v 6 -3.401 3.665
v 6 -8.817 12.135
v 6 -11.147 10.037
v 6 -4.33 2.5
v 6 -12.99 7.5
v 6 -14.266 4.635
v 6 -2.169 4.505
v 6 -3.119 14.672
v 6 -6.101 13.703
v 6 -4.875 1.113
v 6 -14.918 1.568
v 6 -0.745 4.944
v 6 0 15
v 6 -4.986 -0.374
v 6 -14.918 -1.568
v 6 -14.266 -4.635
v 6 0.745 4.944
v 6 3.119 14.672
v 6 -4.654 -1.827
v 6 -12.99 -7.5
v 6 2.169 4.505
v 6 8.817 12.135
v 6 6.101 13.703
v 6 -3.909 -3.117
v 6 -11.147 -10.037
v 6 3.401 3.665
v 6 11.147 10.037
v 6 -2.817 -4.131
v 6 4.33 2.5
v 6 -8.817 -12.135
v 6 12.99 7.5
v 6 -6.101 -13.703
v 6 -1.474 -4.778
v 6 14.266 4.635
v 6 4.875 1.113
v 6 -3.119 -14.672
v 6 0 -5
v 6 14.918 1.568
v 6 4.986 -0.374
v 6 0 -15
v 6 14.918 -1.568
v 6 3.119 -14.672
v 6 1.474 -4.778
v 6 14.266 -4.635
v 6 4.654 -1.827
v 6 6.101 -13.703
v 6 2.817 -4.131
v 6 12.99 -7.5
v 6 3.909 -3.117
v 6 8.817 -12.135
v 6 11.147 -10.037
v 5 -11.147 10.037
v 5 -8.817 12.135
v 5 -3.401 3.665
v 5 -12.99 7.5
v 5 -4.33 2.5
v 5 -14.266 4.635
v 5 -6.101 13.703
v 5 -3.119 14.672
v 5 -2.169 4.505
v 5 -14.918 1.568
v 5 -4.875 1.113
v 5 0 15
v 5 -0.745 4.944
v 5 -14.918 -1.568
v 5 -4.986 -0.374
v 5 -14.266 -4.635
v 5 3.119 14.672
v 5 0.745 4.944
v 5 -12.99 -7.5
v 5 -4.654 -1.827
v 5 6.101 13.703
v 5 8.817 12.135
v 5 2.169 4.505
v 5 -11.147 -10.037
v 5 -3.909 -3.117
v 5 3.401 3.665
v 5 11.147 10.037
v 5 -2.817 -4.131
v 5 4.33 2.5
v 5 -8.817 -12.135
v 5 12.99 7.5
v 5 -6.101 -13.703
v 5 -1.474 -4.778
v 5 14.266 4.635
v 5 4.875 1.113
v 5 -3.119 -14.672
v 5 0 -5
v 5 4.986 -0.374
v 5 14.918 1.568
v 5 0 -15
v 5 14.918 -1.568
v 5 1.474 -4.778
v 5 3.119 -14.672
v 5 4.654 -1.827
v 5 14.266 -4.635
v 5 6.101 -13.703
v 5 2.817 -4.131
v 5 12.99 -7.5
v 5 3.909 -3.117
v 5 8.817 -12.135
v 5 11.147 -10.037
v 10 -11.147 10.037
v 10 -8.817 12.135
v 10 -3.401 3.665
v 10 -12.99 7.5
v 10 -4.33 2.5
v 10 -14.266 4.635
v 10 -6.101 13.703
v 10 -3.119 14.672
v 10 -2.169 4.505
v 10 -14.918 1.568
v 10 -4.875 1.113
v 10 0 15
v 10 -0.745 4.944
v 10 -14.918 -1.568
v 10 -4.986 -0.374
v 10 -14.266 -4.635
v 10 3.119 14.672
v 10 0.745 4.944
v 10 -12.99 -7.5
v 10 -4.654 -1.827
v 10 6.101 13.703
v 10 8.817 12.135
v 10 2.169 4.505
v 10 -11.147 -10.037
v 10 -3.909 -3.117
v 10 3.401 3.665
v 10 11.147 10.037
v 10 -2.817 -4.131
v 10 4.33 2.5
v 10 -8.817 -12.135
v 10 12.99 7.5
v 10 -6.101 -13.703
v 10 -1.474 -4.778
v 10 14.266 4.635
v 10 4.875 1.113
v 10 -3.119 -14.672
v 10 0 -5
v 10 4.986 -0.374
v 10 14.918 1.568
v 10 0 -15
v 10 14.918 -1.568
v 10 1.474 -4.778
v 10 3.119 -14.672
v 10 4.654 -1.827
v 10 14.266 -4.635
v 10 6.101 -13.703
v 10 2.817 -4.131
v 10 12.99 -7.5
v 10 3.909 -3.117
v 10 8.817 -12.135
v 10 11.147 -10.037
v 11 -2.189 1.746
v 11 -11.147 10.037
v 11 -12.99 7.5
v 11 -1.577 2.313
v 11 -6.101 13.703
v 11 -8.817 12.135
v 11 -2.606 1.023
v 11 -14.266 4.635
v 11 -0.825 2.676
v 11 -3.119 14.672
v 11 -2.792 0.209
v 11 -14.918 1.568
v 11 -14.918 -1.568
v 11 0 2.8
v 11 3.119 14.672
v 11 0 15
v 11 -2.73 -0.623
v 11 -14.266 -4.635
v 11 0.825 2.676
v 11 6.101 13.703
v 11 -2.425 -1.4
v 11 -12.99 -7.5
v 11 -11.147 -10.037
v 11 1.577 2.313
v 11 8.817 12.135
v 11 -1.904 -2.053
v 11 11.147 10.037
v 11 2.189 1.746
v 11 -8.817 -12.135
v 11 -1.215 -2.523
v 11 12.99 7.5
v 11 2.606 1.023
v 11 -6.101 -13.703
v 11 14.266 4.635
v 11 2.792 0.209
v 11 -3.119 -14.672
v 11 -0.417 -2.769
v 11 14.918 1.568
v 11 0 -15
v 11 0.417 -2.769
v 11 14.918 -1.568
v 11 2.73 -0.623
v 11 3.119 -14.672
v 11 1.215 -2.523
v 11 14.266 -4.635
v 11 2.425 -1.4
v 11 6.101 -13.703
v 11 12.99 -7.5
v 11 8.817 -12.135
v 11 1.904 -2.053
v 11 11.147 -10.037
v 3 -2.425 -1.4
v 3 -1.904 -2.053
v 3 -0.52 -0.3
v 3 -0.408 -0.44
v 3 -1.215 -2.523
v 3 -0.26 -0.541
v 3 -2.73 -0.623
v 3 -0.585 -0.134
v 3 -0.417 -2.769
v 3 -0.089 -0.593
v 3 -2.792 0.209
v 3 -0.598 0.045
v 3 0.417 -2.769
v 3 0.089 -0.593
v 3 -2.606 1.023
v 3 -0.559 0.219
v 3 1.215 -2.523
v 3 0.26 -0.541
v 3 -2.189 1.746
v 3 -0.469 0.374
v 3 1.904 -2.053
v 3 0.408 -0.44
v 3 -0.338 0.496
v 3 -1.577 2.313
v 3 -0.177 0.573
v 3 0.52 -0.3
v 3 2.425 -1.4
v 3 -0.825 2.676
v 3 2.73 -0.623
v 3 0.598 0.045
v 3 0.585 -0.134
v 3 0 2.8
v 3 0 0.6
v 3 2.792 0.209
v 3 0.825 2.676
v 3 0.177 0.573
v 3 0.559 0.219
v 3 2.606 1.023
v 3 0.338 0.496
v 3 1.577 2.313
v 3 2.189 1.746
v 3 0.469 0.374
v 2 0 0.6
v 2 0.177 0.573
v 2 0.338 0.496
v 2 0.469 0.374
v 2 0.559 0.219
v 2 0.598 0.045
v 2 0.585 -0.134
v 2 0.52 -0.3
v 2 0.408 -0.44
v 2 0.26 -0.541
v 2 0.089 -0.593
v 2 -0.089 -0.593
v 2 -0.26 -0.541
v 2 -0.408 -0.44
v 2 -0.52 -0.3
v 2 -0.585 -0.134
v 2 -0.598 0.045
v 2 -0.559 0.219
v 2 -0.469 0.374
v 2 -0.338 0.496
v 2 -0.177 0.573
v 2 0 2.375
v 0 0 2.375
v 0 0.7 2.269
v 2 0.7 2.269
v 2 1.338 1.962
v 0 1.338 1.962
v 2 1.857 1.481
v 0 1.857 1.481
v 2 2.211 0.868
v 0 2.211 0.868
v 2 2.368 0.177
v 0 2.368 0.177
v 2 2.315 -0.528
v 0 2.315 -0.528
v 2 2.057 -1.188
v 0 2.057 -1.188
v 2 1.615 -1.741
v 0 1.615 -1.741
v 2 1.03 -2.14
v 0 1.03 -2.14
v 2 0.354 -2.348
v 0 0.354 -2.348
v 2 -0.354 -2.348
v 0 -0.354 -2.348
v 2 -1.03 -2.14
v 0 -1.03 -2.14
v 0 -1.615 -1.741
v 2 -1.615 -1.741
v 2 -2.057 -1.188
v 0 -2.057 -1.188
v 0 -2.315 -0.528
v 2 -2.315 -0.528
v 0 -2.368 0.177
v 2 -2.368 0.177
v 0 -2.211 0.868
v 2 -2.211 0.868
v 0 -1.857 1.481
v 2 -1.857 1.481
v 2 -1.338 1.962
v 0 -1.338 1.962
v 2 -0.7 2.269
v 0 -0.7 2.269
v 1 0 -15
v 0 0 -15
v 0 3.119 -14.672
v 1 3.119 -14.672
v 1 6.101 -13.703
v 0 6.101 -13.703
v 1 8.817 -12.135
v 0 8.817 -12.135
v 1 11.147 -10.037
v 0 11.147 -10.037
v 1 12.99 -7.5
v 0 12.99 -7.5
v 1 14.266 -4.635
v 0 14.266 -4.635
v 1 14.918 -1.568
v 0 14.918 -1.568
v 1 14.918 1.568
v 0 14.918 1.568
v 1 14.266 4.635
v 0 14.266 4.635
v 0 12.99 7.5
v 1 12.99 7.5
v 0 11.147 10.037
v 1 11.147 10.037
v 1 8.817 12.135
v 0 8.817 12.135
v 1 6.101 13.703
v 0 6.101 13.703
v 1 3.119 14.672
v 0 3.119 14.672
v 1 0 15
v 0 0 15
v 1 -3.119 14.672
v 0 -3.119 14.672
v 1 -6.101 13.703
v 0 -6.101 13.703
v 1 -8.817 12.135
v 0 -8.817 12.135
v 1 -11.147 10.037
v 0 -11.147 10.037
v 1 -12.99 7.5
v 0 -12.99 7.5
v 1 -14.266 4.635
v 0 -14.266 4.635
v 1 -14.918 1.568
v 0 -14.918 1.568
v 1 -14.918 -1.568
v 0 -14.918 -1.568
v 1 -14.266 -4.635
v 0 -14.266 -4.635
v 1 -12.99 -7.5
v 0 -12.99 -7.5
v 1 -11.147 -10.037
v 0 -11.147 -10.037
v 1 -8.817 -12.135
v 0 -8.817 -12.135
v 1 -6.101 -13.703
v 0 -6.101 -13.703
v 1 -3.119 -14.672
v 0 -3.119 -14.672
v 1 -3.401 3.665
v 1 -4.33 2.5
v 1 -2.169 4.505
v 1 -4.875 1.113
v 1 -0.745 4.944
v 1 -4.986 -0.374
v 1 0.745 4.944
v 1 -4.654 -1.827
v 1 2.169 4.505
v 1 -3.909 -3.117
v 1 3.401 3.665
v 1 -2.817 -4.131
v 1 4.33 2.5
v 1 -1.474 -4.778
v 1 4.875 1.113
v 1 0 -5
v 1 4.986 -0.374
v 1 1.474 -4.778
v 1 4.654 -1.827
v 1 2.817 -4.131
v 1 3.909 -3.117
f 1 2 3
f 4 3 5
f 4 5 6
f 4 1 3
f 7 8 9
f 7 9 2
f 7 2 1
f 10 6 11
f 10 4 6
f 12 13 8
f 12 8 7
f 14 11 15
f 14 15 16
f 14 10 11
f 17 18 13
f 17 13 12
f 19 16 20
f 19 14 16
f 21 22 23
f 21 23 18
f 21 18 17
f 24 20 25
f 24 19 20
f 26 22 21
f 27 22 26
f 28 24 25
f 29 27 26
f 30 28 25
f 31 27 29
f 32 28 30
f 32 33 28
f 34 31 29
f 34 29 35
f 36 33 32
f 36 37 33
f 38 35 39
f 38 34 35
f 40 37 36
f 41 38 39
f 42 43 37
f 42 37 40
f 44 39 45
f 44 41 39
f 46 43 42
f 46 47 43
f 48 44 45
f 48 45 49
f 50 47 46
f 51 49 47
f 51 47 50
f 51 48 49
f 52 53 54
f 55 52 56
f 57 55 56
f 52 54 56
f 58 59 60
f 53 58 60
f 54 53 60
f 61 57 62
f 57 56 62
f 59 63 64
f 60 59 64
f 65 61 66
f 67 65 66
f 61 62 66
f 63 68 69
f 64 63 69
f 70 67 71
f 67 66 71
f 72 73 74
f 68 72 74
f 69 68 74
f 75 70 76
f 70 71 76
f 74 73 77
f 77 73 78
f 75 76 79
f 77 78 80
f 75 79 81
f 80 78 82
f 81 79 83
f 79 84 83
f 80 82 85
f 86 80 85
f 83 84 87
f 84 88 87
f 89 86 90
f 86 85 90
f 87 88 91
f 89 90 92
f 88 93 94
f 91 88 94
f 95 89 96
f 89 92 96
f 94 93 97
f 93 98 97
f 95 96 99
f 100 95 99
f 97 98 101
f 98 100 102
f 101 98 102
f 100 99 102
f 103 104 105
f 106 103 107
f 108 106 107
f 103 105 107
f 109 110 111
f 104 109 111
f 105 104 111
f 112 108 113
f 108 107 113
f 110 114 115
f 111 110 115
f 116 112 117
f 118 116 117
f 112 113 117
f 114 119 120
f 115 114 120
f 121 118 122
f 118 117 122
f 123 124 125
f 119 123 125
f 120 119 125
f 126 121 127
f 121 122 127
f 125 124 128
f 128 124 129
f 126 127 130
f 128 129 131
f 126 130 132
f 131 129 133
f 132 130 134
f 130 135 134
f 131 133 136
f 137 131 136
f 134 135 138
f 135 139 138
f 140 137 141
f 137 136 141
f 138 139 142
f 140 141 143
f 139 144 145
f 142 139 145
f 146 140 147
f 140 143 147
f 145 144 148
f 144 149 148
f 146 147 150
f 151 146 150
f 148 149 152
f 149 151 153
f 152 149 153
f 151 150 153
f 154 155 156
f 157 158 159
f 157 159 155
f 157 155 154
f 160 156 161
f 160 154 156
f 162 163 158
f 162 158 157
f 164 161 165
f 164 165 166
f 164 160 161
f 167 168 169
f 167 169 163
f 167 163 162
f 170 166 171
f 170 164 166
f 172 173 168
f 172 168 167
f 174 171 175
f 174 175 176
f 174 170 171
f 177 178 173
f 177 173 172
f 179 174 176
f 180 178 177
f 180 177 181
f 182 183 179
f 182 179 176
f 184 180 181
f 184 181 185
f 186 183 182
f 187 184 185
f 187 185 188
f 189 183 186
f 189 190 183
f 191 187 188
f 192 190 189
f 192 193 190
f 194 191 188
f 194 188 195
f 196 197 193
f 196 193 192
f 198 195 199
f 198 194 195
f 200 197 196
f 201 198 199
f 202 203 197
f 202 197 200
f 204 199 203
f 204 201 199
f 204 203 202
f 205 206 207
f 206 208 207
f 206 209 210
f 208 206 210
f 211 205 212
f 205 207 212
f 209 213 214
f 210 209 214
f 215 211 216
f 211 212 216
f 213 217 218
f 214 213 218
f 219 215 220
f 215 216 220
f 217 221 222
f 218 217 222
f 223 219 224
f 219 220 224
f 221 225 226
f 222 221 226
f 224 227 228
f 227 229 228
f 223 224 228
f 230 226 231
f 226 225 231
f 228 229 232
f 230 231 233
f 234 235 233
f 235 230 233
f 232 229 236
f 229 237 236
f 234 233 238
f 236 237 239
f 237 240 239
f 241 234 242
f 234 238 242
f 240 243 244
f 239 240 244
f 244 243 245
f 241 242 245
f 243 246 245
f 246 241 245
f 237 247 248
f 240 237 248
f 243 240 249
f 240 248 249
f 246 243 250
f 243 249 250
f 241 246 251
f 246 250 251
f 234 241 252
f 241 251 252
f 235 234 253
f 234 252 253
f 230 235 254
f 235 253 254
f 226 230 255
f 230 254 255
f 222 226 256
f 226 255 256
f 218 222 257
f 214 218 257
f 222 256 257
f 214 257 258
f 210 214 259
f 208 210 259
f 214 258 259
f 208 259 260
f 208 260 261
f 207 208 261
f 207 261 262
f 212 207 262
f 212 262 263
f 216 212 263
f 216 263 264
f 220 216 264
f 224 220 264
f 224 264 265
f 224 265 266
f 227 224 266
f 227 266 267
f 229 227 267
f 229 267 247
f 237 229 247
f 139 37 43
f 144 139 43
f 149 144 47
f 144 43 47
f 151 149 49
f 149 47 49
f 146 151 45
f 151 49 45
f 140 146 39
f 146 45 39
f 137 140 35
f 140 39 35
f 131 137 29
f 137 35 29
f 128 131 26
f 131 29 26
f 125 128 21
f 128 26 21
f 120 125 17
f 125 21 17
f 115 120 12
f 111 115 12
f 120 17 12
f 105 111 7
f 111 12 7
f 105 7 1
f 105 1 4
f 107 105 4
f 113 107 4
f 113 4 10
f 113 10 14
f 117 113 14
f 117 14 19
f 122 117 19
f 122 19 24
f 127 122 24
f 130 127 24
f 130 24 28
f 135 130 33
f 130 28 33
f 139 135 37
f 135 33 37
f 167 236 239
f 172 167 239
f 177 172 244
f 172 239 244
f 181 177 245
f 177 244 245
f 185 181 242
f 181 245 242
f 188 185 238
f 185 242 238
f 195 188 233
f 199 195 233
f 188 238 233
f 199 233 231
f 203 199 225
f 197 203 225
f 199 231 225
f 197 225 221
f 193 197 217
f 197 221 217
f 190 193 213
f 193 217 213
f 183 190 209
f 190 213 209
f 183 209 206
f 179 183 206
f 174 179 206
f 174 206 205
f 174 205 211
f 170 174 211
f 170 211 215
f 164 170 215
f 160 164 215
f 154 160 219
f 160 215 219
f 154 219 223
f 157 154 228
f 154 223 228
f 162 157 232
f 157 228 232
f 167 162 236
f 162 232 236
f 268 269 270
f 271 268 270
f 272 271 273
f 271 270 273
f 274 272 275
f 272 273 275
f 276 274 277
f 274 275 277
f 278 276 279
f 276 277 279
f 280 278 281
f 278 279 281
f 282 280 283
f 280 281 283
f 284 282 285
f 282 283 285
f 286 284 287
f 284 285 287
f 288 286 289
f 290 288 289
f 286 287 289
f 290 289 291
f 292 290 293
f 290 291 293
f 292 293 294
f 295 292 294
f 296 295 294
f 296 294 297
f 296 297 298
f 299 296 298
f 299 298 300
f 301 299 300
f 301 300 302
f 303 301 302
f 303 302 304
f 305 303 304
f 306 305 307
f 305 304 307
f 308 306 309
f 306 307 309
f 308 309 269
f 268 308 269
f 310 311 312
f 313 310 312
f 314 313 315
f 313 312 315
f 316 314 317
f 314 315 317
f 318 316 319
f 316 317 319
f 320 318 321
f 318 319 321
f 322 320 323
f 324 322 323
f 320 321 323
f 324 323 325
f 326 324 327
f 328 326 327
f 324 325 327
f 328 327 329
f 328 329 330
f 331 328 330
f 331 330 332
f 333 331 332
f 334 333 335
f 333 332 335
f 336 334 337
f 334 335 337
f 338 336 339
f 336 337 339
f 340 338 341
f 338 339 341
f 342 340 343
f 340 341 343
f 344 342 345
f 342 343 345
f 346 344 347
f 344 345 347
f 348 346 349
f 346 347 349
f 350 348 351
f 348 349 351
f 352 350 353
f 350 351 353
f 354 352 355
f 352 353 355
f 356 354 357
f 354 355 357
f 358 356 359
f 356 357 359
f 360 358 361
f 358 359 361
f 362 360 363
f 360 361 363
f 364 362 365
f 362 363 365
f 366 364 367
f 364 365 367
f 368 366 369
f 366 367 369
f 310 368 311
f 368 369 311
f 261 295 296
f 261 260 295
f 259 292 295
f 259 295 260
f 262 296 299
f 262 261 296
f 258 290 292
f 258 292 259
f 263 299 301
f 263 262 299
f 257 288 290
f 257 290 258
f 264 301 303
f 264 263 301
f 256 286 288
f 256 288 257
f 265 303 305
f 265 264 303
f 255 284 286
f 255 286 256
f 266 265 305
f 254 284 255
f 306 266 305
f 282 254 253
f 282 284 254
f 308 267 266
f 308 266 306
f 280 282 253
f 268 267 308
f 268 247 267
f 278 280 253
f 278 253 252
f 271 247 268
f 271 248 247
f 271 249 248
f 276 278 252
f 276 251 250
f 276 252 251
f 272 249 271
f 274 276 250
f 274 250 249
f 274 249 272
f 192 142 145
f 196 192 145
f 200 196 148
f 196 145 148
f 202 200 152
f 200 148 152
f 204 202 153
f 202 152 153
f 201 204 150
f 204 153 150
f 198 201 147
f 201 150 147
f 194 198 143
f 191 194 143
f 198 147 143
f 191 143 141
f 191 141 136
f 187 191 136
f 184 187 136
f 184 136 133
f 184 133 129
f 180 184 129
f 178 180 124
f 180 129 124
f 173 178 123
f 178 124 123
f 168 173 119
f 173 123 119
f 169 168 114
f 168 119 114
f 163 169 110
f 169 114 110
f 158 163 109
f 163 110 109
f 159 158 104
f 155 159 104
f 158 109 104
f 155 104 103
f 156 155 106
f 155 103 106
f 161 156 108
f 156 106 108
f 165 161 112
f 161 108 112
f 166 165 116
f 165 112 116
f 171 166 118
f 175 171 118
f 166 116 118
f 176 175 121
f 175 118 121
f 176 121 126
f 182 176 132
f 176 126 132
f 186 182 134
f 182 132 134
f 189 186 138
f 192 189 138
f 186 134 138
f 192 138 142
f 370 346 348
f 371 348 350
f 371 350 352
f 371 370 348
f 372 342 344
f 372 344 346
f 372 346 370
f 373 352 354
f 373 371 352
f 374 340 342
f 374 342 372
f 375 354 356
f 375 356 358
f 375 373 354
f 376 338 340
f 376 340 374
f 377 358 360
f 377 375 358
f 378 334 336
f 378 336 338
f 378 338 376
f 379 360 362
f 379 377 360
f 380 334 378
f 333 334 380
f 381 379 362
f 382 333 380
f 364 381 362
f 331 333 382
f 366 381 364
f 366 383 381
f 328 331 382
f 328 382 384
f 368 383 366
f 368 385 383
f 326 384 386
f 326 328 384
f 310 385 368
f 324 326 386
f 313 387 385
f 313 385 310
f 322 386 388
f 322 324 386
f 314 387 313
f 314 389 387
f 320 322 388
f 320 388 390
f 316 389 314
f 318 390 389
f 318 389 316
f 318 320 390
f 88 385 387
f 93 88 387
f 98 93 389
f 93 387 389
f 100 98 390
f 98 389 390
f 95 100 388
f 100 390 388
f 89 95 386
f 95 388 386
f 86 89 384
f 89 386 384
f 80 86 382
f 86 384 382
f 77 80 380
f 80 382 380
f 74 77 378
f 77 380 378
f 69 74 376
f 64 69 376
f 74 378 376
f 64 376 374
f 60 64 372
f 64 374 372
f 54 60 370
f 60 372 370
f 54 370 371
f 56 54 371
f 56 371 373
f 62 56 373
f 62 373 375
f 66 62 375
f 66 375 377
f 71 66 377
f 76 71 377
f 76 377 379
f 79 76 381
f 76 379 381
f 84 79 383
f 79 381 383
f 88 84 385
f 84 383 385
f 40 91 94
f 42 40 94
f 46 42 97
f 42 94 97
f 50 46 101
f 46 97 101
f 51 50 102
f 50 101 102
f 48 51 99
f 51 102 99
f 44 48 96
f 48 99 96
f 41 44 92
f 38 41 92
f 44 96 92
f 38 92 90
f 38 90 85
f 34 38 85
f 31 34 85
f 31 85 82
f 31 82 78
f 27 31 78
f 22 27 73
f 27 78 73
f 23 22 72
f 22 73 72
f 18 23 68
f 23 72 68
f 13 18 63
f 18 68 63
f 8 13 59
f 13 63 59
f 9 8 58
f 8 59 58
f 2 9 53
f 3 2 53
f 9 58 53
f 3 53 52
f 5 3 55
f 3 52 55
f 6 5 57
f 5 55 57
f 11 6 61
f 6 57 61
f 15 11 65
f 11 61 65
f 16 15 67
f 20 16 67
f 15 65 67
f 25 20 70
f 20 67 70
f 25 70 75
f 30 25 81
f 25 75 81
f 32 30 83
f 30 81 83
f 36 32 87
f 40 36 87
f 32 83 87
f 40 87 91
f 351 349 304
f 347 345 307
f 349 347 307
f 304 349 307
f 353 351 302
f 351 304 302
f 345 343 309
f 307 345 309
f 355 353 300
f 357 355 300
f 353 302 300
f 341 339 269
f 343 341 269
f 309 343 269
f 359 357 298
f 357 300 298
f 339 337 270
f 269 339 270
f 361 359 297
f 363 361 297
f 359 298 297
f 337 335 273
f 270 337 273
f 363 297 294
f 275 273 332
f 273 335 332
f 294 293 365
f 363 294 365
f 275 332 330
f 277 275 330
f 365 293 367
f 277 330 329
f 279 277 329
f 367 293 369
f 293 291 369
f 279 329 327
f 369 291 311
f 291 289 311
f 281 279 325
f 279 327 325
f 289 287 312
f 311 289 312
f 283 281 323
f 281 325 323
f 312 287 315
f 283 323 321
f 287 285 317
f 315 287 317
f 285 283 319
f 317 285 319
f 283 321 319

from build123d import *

# Parameters (mm, degrees)
SKETCH2_R           = 15
SKETCH2_R_2         = 5
BOSS_EXTRUDE1_DEPTH = 1
BOSS_EXTRUDE2_START = 1
SKETCH2_3_R         = 5
BOSS_EXTRUDE2_DEPTH = 4
BOSS_EXTRUDE3_START = 5
SKETCH2_5_R         = 15
SKETCH2_5_R_2       = 5
BOSS_EXTRUDE3_DEPTH = 1
BOSS_EXTRUDE4_START = 6
SKETCH2_6_R         = 5
BOSS_EXTRUDE4_DEPTH = 4
BOSS_EXTRUDE5_START = 10
SKETCH2_7_R         = 15
SKETCH2_7_R_2       = 5
BOSS_EXTRUDE5_DEPTH = 1
SKETCH3_R           = 2.375
CUT_EXTRUDE1_DEPTH  = 2
CUT_EXTRUDE6_START  = -3
SKETCH3_4_R         = 2.8
CUT_EXTRUDE6_DEPTH  = 8
SKETCH3_5_R         = 0.6
CUT_EXTRUDE7_DEPTH  = 3


with BuildPart() as part:
    # Sketch2 → Boss-Extrude1 (new body)
    with BuildSketch(Plane(origin=(0, 0, 0), x_dir=(0, 0, -1), z_dir=(1, 0, 0))):
        Circle(SKETCH2_R)
        Circle(SKETCH2_R_2, mode=Mode.SUBTRACT)
        Circle(SKETCH2_R_2)
    extrude(amount=BOSS_EXTRUDE1_DEPTH)

    # Sketch2<3> → Boss-Extrude2 (add)
    with BuildSketch(Plane(origin=(0, 0, 0), x_dir=(0, 0, -1), z_dir=(1, 0, 0)).offset(BOSS_EXTRUDE2_START)):
        Circle(SKETCH2_3_R)
    extrude(amount=BOSS_EXTRUDE2_DEPTH)

    # Sketch2<5> → Boss-Extrude3 (add)
    with BuildSketch(Plane(origin=(0, 0, 0), x_dir=(0, 0, -1), z_dir=(1, 0, 0)).offset(BOSS_EXTRUDE3_START)):
        Circle(SKETCH2_5_R)
        Circle(SKETCH2_5_R_2, mode=Mode.SUBTRACT)
        Circle(SKETCH2_5_R_2)
    extrude(amount=BOSS_EXTRUDE3_DEPTH)

    # Sketch2<6> → Boss-Extrude4 (add)
    with BuildSketch(Plane(origin=(0, 0, 0), x_dir=(0, 0, -1), z_dir=(1, 0, 0)).offset(BOSS_EXTRUDE4_START)):
        Circle(SKETCH2_6_R)
    extrude(amount=BOSS_EXTRUDE4_DEPTH)

    # Sketch2<7> → Boss-Extrude5 (add)
    with BuildSketch(Plane(origin=(0, 0, 0), x_dir=(0, 0, -1), z_dir=(1, 0, 0)).offset(BOSS_EXTRUDE5_START)):
        Circle(SKETCH2_7_R)
        Circle(SKETCH2_7_R_2, mode=Mode.SUBTRACT)
        Circle(SKETCH2_7_R_2)
    extrude(amount=BOSS_EXTRUDE5_DEPTH)

    # Sketch3 → Cut-Extrude1 (cut)
    with BuildSketch(Plane.ZY):
        Circle(SKETCH3_R)
    extrude(amount=-CUT_EXTRUDE1_DEPTH, mode=Mode.SUBTRACT)

    # Sketch3<4> → Cut-Extrude6 (cut)
    with BuildSketch(Plane.ZY.offset(CUT_EXTRUDE6_START)):
        Circle(SKETCH3_4_R)
    extrude(amount=-CUT_EXTRUDE6_DEPTH, mode=Mode.SUBTRACT)

    # Sketch3<5> → Cut-Extrude7 (cut)
    with BuildSketch(Plane.ZY):
        Circle(SKETCH3_5_R)
    extrude(amount=-CUT_EXTRUDE7_DEPTH, mode=Mode.SUBTRACT)


solid = part.part
